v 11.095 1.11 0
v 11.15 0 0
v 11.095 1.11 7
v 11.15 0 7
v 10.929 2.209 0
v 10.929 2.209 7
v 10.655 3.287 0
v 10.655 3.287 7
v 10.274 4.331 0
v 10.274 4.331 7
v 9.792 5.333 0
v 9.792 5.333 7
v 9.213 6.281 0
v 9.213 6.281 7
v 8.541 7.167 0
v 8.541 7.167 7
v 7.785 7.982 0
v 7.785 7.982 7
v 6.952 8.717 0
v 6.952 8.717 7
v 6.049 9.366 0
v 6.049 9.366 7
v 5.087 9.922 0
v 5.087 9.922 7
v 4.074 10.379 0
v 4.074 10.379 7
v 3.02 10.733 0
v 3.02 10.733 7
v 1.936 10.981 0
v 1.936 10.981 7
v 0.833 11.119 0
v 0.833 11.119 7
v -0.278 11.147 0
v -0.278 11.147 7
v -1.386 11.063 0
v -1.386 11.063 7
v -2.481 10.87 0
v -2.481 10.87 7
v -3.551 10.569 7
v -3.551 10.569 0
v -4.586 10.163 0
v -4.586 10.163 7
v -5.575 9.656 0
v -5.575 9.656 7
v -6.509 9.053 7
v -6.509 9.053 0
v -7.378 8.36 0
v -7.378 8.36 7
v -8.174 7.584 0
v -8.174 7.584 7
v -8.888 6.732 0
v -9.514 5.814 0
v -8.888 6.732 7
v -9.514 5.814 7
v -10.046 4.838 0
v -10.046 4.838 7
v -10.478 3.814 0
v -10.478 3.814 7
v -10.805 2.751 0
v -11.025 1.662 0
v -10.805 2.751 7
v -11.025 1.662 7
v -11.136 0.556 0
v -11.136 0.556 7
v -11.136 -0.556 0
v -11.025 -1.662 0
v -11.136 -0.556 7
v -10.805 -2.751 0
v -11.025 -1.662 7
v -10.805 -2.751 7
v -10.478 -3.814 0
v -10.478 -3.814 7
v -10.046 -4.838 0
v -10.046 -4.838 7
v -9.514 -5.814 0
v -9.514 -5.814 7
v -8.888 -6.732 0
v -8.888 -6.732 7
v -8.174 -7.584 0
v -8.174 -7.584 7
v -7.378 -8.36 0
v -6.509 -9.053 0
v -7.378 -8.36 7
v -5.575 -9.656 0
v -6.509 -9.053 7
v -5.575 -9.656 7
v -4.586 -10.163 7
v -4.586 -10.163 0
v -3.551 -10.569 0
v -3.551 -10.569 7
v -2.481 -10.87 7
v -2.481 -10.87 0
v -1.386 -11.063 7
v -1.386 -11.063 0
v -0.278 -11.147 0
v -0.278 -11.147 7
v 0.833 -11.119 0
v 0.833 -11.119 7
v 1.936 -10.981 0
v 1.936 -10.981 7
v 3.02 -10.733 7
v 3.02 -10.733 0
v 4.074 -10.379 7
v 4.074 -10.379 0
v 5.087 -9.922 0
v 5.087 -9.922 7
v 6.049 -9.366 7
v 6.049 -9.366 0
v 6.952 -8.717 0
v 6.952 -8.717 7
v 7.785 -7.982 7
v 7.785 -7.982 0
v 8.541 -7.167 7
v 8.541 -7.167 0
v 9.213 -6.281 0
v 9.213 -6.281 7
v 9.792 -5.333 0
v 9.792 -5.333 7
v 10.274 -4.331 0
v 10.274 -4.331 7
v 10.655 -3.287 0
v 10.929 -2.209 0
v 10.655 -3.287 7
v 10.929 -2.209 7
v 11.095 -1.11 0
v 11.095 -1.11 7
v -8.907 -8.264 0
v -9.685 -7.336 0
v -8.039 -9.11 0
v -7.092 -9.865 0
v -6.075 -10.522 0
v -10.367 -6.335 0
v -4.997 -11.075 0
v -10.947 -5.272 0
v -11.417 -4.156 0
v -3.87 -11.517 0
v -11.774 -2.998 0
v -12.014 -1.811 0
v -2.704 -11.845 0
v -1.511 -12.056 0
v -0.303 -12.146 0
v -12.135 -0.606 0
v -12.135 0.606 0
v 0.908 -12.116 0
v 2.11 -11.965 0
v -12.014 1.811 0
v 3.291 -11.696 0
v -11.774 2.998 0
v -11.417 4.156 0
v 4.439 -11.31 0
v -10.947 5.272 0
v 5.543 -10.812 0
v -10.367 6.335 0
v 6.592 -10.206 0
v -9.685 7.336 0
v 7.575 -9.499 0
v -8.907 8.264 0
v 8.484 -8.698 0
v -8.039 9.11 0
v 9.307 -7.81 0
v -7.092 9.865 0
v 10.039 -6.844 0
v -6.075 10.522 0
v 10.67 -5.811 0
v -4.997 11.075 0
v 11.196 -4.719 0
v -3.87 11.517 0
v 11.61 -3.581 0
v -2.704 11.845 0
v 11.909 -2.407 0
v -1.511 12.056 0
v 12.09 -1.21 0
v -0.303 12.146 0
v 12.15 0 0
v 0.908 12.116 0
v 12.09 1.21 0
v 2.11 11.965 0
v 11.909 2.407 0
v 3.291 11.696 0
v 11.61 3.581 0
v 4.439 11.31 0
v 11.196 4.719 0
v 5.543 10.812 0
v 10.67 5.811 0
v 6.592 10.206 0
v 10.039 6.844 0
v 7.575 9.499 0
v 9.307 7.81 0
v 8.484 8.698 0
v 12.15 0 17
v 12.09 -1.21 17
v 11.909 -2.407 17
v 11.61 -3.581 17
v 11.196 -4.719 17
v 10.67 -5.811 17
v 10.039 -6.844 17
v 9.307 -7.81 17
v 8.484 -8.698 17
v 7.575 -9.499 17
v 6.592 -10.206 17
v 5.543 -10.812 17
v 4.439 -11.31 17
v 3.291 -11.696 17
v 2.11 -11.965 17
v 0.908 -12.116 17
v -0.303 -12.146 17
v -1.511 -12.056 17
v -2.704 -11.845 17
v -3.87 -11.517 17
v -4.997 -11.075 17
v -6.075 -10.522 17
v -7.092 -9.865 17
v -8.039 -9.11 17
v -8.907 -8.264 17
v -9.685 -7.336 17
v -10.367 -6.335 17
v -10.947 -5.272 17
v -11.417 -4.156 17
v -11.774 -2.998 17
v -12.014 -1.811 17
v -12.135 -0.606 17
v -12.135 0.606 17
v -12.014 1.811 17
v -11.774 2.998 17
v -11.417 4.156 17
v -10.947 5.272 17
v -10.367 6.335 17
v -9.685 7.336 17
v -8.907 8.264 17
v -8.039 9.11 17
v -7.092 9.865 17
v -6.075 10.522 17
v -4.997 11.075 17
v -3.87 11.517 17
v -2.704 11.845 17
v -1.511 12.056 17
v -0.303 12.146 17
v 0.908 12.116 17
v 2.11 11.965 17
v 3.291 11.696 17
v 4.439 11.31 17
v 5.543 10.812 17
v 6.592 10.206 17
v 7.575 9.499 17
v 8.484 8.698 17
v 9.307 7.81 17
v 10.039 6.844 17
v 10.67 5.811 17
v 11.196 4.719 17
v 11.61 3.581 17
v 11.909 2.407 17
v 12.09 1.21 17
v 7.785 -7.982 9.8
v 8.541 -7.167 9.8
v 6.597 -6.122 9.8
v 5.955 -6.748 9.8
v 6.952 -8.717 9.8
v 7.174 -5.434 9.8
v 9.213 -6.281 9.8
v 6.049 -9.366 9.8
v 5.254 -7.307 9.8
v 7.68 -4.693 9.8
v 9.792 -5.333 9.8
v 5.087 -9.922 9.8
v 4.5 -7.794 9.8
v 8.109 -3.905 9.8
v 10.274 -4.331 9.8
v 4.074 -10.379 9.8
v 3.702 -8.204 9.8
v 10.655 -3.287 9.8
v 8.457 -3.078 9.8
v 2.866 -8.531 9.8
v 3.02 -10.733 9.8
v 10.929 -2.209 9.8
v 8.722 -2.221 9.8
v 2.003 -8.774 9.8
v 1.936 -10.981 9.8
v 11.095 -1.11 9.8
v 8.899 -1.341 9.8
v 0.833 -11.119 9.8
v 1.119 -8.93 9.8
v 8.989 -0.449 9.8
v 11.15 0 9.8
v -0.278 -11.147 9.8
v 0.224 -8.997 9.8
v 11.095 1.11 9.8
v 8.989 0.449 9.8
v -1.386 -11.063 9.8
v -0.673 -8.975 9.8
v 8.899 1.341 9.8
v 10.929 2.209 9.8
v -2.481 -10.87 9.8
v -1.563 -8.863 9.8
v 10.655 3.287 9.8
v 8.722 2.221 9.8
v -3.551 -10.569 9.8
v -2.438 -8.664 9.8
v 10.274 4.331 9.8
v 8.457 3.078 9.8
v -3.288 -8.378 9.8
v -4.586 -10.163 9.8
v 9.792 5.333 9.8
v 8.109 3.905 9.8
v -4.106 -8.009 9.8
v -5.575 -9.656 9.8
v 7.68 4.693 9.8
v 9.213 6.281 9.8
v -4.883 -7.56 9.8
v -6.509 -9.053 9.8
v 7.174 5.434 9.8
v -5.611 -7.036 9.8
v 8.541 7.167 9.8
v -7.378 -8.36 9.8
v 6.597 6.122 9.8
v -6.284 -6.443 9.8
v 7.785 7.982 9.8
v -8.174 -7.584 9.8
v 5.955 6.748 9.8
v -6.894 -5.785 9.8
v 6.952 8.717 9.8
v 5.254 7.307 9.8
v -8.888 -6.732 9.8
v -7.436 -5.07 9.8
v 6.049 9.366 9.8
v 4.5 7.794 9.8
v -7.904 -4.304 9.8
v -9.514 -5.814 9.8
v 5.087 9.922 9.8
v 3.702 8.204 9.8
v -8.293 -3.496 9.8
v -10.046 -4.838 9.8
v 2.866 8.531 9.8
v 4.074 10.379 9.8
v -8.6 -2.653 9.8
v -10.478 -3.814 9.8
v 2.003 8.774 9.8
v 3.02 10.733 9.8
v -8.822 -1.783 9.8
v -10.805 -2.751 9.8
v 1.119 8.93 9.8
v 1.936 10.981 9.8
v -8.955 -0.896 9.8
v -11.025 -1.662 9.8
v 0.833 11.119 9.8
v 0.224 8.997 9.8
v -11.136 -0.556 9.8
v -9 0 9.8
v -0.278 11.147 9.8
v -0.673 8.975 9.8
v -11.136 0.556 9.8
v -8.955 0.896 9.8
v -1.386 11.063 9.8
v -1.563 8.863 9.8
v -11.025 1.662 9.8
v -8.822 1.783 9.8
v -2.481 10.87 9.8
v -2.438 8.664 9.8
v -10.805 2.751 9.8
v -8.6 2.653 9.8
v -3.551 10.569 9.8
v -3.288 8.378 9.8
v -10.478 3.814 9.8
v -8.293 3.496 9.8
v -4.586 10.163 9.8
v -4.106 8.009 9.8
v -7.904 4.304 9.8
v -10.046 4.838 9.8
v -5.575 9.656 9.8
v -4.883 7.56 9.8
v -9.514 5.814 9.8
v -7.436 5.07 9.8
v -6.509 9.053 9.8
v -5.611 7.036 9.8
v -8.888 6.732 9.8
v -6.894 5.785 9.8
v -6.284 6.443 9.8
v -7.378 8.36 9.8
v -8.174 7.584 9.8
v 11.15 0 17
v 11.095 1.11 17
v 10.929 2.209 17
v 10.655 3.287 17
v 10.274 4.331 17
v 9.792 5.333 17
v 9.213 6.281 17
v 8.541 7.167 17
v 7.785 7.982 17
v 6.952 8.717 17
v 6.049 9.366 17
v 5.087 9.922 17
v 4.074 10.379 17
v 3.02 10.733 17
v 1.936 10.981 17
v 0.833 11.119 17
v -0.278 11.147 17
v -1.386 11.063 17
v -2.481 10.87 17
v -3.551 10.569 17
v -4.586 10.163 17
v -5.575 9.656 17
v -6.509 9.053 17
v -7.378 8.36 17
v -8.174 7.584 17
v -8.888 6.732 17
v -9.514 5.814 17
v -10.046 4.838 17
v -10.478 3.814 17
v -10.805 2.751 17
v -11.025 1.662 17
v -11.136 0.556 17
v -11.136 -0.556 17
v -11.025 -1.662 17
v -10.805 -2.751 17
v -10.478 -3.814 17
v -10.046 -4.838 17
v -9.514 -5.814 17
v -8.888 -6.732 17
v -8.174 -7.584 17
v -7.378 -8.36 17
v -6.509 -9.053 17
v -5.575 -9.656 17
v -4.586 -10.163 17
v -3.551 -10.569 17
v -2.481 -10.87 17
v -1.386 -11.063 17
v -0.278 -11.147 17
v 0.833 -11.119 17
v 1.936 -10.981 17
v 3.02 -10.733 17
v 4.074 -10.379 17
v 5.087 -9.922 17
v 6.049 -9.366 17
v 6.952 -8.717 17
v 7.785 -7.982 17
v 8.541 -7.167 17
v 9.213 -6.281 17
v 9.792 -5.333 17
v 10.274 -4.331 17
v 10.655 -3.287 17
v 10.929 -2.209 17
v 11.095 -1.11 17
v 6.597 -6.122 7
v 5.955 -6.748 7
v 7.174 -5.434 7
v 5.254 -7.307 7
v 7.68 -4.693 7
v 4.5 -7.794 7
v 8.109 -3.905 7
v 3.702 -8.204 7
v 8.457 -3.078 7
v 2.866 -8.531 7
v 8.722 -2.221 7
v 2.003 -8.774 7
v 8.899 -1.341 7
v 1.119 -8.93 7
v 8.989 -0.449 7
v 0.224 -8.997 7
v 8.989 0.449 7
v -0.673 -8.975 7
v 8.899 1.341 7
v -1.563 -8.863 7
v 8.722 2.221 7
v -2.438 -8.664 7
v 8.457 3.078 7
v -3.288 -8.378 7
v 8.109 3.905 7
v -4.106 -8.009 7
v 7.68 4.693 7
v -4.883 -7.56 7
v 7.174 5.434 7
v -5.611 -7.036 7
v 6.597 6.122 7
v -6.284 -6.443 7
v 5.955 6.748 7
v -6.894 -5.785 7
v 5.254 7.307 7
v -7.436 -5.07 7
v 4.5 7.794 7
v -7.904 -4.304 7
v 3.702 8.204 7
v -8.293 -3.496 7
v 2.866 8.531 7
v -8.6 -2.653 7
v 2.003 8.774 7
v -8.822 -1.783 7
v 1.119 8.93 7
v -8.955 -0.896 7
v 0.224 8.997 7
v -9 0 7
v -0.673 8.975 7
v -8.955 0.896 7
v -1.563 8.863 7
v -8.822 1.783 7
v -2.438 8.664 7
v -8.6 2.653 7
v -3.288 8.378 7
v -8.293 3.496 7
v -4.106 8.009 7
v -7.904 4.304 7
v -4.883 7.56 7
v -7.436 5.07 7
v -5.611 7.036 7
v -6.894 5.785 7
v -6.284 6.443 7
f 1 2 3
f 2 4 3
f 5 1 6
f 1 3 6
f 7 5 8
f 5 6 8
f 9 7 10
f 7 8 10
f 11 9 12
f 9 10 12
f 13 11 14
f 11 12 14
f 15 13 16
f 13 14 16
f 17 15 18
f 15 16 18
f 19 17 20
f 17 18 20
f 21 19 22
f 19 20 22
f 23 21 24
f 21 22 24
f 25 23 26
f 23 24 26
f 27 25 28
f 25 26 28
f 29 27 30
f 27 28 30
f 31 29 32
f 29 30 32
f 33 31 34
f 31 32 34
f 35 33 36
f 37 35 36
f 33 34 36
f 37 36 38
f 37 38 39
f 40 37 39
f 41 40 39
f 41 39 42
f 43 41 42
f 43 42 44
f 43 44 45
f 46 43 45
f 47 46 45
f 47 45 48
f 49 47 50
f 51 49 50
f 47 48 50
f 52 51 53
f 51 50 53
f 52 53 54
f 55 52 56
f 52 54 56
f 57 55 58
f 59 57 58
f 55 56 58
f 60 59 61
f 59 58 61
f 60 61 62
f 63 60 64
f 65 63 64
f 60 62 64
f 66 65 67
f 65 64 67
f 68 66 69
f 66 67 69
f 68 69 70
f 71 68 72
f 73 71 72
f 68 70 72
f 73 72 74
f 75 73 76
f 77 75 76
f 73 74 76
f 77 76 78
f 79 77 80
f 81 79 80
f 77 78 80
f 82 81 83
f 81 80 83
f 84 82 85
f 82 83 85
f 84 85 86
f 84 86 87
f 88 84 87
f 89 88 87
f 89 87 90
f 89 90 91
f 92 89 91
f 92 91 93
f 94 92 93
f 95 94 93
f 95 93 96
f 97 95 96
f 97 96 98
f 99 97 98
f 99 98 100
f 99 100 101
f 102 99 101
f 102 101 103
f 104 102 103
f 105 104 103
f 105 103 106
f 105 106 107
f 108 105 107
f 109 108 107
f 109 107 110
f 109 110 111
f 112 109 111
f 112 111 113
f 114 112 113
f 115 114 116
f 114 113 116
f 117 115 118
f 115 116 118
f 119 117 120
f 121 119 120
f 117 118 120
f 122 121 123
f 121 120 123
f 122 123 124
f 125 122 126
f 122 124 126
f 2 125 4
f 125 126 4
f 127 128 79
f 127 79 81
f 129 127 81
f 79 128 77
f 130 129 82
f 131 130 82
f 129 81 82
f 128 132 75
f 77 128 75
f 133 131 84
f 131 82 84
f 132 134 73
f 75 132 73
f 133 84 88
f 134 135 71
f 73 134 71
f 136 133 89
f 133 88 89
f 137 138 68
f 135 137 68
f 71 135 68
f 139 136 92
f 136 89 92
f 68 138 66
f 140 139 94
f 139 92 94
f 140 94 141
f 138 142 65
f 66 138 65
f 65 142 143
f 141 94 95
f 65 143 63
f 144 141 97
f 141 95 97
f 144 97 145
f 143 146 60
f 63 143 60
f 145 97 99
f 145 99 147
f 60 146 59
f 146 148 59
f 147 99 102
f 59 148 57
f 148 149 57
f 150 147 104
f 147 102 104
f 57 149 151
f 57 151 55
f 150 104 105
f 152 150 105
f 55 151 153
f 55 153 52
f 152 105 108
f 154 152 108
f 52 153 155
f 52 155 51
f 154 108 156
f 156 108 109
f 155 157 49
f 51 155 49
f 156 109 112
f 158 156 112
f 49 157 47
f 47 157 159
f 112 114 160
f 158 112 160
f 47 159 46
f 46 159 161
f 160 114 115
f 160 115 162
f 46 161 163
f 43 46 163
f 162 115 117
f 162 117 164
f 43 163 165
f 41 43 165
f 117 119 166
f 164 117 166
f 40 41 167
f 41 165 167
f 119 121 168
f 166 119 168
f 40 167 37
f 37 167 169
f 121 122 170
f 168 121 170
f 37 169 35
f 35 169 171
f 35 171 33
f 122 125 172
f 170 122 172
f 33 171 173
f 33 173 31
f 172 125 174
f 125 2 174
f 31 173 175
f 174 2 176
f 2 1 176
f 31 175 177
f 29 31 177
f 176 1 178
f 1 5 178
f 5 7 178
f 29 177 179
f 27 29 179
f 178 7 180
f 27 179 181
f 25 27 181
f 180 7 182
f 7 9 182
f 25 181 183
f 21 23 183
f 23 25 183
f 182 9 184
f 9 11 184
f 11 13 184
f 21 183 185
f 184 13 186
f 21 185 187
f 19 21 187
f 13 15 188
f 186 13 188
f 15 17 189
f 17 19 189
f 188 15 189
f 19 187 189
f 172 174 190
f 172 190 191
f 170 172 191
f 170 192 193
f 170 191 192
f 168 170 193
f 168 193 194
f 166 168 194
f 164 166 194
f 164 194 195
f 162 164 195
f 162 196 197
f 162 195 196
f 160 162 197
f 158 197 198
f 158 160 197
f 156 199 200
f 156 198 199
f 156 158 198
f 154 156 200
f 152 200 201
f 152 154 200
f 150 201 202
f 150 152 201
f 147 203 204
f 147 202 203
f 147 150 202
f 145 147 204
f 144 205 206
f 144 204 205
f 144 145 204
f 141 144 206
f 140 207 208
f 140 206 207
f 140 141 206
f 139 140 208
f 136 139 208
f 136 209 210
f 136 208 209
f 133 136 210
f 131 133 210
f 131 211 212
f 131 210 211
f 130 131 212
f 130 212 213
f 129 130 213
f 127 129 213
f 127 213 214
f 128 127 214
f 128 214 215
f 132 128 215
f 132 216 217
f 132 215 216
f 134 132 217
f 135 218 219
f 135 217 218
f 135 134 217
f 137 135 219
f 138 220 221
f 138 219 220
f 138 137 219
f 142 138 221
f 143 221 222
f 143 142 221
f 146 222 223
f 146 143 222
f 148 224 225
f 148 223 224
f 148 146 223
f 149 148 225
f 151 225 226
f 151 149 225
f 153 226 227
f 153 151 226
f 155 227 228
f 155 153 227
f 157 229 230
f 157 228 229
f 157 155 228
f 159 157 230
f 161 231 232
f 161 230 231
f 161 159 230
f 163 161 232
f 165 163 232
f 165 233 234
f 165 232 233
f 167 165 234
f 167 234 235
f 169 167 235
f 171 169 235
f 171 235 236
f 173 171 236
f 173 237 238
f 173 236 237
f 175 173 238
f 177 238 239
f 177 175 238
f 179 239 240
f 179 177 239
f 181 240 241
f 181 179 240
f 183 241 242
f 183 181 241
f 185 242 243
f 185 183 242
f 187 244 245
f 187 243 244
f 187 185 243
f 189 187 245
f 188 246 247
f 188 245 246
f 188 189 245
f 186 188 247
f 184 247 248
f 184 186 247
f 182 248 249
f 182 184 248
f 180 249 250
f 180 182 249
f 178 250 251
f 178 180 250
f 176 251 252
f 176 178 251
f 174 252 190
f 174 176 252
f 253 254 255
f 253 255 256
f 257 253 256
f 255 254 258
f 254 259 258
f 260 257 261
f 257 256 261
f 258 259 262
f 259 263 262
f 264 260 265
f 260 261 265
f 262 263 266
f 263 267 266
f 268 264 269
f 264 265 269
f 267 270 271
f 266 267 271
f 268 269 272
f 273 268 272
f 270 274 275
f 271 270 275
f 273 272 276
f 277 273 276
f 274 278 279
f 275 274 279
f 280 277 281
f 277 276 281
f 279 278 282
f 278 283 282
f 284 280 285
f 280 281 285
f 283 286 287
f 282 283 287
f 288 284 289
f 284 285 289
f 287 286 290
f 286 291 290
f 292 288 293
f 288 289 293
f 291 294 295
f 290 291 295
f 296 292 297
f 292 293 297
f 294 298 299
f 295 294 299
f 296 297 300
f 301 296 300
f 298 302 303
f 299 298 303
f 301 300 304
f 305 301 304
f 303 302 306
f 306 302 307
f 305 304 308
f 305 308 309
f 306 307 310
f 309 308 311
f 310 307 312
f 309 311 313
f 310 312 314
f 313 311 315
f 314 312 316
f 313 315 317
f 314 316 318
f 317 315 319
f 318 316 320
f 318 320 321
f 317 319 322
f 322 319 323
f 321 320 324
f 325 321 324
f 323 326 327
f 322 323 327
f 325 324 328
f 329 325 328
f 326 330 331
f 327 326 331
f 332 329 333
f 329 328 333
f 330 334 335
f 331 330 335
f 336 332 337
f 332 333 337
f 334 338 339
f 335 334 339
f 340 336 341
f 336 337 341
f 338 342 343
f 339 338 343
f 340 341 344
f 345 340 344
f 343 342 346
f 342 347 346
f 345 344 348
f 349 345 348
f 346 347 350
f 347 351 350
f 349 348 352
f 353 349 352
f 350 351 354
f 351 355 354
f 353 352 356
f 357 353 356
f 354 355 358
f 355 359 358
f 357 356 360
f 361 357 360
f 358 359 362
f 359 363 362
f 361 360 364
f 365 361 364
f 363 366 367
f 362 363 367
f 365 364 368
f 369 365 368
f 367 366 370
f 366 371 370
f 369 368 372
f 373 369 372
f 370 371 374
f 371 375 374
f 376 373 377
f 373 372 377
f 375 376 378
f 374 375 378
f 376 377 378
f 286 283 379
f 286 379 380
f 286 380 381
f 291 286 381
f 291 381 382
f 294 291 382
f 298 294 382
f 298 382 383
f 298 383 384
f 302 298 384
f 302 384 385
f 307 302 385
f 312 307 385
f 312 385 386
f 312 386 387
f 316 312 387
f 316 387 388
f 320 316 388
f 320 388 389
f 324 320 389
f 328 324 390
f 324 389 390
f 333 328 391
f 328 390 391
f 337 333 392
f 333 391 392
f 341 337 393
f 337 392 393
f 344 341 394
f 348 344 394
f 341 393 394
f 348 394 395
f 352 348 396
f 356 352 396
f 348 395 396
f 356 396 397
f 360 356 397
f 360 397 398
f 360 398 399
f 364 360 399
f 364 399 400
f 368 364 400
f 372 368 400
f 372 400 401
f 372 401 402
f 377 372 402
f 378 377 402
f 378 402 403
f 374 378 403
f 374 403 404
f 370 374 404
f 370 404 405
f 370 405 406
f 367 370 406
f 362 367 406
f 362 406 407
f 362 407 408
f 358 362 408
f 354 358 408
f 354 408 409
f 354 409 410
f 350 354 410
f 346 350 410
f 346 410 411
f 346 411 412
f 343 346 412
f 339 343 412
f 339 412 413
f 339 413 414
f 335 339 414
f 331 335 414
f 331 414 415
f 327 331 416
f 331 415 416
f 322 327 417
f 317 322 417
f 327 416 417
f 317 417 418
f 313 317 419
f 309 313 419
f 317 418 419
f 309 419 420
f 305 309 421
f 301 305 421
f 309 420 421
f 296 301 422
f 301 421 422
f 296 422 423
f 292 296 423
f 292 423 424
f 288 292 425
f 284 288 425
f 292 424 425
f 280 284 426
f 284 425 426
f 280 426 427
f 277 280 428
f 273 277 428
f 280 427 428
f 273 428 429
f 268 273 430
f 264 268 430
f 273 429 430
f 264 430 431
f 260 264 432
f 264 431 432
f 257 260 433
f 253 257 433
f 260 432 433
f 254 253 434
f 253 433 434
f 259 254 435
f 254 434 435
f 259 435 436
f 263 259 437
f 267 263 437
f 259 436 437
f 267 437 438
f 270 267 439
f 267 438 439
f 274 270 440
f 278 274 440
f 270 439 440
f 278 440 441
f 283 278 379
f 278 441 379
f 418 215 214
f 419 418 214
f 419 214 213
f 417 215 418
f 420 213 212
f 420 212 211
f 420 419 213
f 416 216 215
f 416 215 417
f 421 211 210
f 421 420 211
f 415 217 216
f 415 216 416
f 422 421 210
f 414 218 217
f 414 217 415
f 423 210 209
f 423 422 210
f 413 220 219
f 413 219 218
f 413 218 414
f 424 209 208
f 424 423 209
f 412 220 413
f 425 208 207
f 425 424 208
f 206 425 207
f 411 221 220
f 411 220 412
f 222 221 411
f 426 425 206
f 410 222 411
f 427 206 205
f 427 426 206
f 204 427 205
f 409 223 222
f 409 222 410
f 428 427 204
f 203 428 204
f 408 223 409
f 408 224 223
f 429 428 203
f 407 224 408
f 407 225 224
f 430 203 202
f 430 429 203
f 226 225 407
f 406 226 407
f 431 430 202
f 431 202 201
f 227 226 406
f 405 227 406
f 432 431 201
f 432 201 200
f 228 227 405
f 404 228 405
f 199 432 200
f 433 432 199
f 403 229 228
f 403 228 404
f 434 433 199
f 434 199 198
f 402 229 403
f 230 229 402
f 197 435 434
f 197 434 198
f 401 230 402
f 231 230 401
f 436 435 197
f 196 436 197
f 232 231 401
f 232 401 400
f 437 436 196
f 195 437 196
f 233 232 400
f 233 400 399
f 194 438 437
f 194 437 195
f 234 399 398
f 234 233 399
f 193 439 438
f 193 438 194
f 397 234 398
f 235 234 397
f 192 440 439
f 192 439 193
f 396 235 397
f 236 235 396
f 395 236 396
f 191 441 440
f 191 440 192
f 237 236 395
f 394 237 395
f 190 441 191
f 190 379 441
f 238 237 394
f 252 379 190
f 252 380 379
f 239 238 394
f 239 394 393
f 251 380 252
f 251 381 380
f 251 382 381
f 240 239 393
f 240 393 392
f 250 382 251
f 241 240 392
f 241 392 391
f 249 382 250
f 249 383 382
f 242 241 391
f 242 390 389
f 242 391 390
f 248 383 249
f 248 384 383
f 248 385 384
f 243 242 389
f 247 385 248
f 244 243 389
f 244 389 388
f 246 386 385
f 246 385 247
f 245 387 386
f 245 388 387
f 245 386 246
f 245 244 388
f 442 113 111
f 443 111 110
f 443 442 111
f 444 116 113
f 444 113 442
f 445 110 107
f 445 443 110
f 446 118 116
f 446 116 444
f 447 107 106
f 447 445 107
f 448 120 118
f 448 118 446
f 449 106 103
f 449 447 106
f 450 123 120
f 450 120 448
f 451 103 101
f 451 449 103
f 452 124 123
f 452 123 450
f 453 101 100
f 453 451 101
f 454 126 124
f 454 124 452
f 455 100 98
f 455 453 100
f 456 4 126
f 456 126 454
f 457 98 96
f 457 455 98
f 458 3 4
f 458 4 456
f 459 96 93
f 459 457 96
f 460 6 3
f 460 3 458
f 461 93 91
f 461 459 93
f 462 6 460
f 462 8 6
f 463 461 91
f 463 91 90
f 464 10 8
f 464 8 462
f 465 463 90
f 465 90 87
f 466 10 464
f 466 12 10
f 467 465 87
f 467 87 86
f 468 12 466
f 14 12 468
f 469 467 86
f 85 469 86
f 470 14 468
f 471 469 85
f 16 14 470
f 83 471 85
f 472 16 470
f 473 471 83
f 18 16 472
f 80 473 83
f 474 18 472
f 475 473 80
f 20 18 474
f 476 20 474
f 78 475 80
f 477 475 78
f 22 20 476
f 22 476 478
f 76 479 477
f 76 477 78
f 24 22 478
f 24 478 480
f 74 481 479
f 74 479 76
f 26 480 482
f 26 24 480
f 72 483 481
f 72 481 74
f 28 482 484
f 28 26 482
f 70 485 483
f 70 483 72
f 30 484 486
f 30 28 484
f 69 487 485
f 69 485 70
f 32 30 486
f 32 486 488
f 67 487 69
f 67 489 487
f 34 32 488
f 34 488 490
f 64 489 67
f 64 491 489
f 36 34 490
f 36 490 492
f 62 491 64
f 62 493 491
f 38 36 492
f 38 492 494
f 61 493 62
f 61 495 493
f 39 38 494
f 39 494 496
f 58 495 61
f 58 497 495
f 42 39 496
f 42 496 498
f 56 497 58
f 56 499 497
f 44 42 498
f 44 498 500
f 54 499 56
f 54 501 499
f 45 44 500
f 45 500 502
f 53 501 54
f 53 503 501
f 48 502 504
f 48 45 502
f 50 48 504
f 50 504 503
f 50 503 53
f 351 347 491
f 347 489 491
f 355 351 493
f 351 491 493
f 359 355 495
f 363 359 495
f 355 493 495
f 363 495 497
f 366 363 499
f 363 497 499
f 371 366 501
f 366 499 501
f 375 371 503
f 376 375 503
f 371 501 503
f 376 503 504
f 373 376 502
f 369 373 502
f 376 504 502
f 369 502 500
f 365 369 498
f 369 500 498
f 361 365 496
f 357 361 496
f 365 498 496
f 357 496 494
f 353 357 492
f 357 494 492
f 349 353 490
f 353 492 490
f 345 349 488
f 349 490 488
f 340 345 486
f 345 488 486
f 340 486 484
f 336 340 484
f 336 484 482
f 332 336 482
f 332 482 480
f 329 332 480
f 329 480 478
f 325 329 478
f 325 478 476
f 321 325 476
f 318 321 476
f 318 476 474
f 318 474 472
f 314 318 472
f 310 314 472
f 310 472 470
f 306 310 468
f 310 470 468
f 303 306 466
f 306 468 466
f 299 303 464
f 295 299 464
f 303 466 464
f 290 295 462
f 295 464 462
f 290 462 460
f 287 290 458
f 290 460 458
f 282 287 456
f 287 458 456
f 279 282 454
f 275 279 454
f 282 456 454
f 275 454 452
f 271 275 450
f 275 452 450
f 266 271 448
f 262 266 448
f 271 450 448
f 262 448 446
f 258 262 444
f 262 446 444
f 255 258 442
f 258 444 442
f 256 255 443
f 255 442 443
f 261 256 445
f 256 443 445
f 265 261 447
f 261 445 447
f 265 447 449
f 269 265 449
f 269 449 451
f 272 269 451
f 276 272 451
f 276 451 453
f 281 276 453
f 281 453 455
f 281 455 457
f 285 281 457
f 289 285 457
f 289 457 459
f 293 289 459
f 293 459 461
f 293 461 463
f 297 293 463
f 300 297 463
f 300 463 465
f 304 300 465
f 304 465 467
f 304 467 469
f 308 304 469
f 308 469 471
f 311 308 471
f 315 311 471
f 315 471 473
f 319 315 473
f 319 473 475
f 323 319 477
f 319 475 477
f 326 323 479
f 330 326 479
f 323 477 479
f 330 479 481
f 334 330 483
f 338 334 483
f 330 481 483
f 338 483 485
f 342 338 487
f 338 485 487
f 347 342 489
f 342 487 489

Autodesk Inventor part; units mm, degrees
ref_plane "YZ Plane" through (0, 0, 0) normal (1, 0, 0) x (0, 1, 0)
ref_plane "XZ Plane" through (0, 0, 0) normal (0, 1, 0) x (-1, 0, 0)
sketch "Sketch1" plane through (0, 0, 0) normal (0, 0, 1) x (1, 0, 0)
  circle A0 centre (0, 0) radius 12.15
  dimension "d0" = 24.3
extrude "Extrusion1" add sketch "Sketch1" along normal blind 17
sketch "Sketch2" plane through (0, 0, 17) normal (0, 0, 1) x (1, 0, 0)
  circle A0 centre (0, 0) radius 11.15
  dimension "d3" = 22.3
extrude "Extrusion2" cut sketch "Sketch2" against normal blind 20
ref_plane "Work Plane1" through (0, 0, 7) normal (0, 0, -1) x (-1, 0, 0)
sketch "Sketch3" plane through (0, 0, 7) normal (0, 0, -1) x (-1, 0, 0)
  circle A0 centre (0, 0) radius 11.15 projected
  circle A1 centre (0, 0) radius 9
  dimension "d7" = 18
extrude "Extrusion3" add sketch "Sketch3" against normal blind 2.8
properties part number "_3DPrint"
